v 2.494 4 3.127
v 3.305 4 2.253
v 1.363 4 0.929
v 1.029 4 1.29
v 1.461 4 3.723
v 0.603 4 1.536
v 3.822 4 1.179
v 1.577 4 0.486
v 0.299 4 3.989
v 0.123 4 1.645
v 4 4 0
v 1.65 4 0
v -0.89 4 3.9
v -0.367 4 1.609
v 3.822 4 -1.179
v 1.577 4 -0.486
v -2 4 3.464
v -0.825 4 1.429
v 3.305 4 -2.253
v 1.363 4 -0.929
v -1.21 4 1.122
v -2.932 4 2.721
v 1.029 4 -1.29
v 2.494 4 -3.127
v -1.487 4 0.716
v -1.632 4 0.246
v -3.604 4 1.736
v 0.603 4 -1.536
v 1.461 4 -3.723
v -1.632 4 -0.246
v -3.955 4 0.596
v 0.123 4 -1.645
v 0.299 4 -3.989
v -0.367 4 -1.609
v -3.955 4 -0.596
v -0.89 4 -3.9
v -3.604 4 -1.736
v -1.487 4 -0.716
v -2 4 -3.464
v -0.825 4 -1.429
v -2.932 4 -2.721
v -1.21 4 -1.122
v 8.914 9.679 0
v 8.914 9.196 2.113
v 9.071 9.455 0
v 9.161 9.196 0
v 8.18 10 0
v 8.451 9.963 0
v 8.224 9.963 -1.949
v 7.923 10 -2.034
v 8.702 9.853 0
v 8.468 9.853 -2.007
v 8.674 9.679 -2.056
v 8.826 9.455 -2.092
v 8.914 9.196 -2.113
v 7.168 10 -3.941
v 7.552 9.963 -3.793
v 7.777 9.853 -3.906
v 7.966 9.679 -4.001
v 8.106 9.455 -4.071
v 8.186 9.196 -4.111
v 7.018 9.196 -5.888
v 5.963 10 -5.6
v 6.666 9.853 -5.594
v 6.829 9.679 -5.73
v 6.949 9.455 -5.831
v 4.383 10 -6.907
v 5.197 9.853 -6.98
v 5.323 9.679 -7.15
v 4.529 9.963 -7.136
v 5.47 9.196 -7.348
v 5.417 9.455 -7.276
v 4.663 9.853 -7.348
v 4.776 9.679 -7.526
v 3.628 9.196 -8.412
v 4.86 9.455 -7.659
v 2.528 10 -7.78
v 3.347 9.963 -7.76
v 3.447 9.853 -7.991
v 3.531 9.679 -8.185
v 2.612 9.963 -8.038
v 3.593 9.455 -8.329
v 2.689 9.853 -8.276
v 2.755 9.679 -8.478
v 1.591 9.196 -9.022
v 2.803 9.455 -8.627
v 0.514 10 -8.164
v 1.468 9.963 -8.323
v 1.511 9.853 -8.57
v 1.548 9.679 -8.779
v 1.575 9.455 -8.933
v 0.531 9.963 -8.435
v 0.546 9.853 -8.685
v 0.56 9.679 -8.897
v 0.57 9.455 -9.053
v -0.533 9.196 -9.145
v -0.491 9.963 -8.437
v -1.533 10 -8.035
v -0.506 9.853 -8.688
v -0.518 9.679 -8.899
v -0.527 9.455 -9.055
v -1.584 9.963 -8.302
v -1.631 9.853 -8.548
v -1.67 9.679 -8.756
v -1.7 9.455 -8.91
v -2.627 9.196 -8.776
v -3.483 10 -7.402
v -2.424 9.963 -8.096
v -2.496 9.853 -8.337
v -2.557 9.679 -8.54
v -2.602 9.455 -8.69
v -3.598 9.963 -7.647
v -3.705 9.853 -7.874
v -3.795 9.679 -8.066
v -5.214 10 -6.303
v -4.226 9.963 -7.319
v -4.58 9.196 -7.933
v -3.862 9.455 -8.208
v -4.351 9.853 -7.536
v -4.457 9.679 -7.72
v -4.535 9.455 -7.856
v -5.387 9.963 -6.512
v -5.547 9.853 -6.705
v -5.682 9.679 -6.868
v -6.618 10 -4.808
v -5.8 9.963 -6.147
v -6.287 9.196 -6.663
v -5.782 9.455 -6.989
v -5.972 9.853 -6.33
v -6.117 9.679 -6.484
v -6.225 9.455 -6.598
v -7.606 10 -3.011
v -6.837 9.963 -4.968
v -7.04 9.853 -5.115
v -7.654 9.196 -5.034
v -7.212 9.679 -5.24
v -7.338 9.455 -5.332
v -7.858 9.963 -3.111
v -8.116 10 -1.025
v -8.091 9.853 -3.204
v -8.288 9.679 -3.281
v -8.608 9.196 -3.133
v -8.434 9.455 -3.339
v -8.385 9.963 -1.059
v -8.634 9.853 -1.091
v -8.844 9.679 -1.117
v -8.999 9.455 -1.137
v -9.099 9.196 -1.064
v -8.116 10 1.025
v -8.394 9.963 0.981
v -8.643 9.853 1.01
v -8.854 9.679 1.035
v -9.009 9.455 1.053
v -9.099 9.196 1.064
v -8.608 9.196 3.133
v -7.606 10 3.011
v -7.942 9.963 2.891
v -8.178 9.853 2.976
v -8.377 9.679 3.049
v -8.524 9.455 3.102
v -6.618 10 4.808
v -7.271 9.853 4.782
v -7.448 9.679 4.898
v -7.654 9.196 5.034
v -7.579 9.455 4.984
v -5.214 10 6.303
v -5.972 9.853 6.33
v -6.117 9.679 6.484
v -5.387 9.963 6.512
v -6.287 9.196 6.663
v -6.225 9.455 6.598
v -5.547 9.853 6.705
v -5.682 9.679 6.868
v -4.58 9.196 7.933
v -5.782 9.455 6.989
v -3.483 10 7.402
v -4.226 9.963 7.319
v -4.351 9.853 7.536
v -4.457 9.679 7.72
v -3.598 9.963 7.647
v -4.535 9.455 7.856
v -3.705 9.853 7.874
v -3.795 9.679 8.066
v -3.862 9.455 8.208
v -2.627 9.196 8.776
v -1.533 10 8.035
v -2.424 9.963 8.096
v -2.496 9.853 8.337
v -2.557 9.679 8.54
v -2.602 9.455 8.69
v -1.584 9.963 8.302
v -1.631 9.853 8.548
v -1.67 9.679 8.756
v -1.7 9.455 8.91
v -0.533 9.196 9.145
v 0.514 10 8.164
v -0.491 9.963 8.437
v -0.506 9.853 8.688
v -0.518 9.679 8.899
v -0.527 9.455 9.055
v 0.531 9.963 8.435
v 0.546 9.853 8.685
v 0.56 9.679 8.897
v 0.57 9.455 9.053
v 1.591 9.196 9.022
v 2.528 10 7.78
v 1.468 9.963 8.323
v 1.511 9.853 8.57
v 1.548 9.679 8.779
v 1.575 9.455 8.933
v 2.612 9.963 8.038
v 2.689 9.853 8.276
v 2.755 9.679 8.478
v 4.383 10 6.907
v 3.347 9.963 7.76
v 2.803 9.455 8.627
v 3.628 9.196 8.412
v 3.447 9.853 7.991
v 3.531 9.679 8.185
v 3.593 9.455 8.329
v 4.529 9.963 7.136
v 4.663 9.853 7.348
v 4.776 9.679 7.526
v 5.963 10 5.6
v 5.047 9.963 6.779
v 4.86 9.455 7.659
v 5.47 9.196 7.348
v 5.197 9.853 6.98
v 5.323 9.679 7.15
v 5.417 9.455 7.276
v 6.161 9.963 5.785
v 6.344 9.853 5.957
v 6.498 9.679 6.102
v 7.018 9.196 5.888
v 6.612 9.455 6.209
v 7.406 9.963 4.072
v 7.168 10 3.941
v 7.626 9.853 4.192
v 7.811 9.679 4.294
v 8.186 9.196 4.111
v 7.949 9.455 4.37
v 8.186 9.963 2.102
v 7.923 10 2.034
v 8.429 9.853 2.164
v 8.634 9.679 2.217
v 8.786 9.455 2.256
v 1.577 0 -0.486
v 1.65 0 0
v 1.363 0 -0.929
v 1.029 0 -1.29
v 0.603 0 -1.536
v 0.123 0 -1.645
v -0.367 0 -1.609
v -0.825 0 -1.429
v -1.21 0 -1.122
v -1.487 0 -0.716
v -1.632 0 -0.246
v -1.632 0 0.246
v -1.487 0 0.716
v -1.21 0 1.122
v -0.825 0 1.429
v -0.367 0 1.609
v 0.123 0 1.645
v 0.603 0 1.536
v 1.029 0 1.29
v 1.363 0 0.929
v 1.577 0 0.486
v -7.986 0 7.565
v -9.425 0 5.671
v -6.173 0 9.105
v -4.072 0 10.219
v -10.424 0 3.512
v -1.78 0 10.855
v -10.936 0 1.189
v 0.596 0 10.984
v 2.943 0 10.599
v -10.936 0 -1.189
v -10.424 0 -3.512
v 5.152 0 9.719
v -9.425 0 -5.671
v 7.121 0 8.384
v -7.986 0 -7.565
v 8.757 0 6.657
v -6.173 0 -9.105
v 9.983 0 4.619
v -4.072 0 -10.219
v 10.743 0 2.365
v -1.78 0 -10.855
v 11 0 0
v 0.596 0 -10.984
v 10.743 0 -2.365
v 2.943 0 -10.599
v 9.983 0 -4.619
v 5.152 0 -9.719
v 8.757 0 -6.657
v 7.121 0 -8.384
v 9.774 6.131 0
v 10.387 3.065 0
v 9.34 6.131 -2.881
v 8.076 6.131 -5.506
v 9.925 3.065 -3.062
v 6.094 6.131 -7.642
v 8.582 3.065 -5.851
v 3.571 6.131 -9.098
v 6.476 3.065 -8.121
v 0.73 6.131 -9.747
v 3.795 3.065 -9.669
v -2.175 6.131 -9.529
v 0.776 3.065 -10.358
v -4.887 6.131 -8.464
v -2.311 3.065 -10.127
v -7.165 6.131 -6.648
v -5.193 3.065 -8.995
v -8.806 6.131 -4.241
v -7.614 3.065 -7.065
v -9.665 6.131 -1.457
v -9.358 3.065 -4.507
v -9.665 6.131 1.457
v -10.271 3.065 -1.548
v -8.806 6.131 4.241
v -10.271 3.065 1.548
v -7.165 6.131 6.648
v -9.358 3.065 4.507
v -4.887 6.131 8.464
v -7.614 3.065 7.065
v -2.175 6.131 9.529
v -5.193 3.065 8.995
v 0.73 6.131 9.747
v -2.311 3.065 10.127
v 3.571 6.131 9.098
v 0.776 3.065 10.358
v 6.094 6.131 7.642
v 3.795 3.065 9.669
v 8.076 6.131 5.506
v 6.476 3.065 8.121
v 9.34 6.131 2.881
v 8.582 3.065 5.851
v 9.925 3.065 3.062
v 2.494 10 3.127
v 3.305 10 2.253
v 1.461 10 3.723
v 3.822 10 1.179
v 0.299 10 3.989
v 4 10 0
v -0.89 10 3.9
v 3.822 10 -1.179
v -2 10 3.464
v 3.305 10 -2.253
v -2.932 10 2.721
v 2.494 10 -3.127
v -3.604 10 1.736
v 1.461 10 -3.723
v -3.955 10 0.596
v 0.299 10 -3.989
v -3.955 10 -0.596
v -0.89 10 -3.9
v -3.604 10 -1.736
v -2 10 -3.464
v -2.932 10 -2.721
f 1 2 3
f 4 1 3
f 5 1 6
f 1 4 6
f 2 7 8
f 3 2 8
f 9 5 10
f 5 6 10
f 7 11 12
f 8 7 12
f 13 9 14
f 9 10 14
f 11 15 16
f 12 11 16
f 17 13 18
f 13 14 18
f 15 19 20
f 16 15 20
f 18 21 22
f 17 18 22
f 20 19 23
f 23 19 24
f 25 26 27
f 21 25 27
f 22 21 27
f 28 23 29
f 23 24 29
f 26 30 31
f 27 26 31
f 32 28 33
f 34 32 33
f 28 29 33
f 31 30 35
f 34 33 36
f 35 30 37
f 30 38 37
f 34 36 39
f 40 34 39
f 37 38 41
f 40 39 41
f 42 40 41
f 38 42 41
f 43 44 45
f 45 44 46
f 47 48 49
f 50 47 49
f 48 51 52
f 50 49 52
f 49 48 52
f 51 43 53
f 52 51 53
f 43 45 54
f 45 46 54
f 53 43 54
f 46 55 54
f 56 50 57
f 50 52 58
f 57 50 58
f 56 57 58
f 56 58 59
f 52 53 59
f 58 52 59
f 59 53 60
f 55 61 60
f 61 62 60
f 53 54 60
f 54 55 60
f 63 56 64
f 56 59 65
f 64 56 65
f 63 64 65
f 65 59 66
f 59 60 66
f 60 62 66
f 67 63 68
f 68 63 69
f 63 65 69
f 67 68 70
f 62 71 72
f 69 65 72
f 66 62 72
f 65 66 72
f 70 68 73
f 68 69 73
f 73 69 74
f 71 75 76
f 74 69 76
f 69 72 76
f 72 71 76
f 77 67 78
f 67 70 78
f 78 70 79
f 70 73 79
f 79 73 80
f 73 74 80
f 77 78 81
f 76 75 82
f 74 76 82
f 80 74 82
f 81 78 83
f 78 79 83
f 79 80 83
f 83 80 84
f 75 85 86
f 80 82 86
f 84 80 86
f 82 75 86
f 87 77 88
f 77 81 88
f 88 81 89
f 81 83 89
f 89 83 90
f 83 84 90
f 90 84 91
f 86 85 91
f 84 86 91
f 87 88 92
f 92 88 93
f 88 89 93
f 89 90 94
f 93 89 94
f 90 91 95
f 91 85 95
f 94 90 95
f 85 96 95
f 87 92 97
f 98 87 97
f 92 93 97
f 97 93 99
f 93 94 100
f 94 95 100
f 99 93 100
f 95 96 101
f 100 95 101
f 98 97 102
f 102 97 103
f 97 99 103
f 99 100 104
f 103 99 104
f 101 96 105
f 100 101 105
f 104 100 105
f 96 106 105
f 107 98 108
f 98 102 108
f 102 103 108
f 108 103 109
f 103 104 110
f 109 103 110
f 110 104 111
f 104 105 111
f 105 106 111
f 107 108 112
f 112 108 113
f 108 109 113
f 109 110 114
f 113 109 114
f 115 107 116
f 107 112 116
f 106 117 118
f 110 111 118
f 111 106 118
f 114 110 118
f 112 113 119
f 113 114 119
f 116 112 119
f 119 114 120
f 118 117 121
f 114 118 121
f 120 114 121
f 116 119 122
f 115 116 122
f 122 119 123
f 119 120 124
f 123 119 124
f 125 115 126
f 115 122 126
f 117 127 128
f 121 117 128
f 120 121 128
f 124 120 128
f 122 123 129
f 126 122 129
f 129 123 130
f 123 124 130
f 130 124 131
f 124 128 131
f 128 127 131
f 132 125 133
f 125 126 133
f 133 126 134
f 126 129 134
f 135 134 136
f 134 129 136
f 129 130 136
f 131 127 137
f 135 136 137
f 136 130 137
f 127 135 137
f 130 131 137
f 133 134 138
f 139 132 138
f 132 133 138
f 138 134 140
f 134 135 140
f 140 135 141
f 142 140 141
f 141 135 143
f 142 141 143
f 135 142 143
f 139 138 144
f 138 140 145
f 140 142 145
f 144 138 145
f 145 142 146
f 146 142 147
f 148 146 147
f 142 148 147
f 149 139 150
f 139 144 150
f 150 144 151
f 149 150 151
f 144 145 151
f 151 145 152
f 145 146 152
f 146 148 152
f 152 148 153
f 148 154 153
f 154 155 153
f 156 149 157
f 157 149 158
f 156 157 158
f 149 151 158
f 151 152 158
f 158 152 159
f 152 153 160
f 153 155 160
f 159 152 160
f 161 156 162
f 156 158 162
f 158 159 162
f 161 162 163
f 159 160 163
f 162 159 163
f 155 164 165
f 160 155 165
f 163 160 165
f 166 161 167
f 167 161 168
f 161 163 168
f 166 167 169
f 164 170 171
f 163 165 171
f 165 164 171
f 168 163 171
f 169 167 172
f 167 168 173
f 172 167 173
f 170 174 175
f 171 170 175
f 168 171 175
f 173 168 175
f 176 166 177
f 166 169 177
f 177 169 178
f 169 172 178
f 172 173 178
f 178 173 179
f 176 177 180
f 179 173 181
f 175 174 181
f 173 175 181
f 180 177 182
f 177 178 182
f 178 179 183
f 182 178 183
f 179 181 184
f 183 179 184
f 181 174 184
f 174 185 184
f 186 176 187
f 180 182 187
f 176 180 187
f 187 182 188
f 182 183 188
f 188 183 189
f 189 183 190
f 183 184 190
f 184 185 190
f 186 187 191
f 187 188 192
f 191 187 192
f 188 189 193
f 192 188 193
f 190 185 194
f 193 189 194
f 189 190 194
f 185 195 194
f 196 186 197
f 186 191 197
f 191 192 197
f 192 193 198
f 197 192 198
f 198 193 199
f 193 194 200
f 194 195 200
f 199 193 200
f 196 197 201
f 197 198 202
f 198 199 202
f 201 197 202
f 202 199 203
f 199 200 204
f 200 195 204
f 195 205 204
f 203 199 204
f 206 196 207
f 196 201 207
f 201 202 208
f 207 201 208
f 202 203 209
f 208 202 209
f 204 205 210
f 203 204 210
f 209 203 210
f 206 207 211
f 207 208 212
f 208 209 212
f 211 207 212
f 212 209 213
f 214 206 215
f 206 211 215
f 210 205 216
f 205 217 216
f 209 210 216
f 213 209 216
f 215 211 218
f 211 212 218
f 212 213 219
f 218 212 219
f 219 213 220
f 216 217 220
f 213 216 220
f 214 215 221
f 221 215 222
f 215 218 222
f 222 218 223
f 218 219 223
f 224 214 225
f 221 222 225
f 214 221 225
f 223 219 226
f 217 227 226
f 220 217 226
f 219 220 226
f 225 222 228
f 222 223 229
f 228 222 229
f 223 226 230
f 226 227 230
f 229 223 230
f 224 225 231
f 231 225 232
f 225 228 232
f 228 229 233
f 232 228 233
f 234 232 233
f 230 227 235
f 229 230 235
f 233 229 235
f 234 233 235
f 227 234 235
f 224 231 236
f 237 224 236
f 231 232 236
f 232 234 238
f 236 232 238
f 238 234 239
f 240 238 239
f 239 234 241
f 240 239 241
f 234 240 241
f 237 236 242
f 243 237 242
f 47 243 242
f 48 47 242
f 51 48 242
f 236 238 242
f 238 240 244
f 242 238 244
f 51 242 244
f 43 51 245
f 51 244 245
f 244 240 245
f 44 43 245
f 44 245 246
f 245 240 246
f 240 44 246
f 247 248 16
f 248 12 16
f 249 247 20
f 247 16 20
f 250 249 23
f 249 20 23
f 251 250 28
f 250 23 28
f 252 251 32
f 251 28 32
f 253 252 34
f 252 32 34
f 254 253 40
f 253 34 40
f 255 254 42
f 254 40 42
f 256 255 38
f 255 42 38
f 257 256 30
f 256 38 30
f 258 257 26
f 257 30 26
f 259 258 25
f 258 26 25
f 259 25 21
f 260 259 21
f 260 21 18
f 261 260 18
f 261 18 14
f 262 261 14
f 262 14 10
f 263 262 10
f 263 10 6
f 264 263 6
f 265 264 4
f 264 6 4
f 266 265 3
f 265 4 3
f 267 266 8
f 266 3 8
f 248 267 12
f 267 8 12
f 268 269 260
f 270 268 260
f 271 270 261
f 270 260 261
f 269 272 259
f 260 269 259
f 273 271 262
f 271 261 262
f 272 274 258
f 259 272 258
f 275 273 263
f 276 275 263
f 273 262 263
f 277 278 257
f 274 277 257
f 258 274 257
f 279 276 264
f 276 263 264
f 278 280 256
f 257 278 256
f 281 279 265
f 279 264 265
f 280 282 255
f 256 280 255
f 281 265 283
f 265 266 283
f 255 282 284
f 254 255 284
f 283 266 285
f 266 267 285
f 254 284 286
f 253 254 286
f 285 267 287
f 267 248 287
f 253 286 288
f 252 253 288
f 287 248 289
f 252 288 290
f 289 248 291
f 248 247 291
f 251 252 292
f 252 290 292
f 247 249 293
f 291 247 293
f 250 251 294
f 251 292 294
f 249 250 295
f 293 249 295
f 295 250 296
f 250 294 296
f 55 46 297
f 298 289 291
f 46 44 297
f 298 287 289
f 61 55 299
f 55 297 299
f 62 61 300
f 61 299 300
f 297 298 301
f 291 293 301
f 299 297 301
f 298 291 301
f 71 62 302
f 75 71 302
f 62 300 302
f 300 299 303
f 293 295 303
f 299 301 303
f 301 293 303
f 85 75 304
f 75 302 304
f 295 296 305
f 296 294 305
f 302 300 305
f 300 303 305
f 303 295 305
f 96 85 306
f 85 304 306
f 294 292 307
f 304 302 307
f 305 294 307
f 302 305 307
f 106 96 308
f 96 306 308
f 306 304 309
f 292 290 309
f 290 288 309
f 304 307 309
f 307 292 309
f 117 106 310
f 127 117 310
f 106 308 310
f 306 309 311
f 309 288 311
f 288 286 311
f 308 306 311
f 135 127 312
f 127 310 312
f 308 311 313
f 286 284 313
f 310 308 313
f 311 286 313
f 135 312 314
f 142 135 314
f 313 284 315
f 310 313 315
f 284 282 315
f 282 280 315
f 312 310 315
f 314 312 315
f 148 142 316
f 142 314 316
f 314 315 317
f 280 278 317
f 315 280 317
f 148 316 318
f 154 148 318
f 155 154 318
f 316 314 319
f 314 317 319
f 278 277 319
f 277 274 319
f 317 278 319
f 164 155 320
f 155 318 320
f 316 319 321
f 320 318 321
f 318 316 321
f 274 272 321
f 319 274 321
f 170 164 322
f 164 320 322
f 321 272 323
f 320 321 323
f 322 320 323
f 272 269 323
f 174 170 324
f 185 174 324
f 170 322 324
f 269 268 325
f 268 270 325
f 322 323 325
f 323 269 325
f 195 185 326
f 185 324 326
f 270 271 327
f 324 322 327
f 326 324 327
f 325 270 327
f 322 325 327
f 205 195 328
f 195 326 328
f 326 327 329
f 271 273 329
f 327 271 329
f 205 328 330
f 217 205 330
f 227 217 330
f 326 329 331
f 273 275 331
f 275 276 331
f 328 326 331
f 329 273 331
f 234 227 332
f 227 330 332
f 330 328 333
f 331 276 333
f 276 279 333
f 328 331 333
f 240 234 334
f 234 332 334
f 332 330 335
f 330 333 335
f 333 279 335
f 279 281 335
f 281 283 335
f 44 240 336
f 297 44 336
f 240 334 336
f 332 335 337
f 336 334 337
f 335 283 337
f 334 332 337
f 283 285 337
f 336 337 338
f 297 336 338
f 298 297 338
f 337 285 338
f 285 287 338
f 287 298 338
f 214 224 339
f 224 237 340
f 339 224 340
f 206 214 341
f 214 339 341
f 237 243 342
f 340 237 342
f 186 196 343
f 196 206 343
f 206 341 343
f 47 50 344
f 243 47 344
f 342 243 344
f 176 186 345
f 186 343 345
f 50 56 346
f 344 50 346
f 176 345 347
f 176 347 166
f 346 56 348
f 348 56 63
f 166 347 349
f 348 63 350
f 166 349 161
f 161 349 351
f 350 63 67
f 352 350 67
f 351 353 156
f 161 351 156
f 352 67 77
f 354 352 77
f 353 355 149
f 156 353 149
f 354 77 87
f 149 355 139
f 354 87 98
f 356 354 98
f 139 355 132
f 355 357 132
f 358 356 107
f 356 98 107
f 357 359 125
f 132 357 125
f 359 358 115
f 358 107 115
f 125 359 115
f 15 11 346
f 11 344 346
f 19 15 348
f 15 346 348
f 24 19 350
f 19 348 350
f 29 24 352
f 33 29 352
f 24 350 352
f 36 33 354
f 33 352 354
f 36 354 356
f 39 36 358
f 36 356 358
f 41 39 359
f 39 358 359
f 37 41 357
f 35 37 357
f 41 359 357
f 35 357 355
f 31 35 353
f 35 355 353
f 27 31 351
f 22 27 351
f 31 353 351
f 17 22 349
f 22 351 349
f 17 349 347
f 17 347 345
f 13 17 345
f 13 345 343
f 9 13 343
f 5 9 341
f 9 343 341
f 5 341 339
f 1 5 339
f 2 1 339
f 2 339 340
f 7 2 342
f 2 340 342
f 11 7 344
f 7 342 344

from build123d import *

# Parameters (mm, degrees)
FILLET_1_R = 1


with BuildPart() as part:
    # 草图6 → 旋转1 (revolve)
    with BuildSketch(Plane.XY):
        Polygon((1.65, 0), (1.65, 4), (4, 4), (4, 10), (9, 10), (11, 0), align=None)
    revolve(axis=Axis((0, 0, 0), (0, 1, 0)))

    # 圆角1
    fillet_1_edges = [part.edges().sort_by_distance(p)[0] for p in [
        (-9, 10, 0),
    ]]
    fillet(fillet_1_edges, radius=FILLET_1_R)


solid = part.part
